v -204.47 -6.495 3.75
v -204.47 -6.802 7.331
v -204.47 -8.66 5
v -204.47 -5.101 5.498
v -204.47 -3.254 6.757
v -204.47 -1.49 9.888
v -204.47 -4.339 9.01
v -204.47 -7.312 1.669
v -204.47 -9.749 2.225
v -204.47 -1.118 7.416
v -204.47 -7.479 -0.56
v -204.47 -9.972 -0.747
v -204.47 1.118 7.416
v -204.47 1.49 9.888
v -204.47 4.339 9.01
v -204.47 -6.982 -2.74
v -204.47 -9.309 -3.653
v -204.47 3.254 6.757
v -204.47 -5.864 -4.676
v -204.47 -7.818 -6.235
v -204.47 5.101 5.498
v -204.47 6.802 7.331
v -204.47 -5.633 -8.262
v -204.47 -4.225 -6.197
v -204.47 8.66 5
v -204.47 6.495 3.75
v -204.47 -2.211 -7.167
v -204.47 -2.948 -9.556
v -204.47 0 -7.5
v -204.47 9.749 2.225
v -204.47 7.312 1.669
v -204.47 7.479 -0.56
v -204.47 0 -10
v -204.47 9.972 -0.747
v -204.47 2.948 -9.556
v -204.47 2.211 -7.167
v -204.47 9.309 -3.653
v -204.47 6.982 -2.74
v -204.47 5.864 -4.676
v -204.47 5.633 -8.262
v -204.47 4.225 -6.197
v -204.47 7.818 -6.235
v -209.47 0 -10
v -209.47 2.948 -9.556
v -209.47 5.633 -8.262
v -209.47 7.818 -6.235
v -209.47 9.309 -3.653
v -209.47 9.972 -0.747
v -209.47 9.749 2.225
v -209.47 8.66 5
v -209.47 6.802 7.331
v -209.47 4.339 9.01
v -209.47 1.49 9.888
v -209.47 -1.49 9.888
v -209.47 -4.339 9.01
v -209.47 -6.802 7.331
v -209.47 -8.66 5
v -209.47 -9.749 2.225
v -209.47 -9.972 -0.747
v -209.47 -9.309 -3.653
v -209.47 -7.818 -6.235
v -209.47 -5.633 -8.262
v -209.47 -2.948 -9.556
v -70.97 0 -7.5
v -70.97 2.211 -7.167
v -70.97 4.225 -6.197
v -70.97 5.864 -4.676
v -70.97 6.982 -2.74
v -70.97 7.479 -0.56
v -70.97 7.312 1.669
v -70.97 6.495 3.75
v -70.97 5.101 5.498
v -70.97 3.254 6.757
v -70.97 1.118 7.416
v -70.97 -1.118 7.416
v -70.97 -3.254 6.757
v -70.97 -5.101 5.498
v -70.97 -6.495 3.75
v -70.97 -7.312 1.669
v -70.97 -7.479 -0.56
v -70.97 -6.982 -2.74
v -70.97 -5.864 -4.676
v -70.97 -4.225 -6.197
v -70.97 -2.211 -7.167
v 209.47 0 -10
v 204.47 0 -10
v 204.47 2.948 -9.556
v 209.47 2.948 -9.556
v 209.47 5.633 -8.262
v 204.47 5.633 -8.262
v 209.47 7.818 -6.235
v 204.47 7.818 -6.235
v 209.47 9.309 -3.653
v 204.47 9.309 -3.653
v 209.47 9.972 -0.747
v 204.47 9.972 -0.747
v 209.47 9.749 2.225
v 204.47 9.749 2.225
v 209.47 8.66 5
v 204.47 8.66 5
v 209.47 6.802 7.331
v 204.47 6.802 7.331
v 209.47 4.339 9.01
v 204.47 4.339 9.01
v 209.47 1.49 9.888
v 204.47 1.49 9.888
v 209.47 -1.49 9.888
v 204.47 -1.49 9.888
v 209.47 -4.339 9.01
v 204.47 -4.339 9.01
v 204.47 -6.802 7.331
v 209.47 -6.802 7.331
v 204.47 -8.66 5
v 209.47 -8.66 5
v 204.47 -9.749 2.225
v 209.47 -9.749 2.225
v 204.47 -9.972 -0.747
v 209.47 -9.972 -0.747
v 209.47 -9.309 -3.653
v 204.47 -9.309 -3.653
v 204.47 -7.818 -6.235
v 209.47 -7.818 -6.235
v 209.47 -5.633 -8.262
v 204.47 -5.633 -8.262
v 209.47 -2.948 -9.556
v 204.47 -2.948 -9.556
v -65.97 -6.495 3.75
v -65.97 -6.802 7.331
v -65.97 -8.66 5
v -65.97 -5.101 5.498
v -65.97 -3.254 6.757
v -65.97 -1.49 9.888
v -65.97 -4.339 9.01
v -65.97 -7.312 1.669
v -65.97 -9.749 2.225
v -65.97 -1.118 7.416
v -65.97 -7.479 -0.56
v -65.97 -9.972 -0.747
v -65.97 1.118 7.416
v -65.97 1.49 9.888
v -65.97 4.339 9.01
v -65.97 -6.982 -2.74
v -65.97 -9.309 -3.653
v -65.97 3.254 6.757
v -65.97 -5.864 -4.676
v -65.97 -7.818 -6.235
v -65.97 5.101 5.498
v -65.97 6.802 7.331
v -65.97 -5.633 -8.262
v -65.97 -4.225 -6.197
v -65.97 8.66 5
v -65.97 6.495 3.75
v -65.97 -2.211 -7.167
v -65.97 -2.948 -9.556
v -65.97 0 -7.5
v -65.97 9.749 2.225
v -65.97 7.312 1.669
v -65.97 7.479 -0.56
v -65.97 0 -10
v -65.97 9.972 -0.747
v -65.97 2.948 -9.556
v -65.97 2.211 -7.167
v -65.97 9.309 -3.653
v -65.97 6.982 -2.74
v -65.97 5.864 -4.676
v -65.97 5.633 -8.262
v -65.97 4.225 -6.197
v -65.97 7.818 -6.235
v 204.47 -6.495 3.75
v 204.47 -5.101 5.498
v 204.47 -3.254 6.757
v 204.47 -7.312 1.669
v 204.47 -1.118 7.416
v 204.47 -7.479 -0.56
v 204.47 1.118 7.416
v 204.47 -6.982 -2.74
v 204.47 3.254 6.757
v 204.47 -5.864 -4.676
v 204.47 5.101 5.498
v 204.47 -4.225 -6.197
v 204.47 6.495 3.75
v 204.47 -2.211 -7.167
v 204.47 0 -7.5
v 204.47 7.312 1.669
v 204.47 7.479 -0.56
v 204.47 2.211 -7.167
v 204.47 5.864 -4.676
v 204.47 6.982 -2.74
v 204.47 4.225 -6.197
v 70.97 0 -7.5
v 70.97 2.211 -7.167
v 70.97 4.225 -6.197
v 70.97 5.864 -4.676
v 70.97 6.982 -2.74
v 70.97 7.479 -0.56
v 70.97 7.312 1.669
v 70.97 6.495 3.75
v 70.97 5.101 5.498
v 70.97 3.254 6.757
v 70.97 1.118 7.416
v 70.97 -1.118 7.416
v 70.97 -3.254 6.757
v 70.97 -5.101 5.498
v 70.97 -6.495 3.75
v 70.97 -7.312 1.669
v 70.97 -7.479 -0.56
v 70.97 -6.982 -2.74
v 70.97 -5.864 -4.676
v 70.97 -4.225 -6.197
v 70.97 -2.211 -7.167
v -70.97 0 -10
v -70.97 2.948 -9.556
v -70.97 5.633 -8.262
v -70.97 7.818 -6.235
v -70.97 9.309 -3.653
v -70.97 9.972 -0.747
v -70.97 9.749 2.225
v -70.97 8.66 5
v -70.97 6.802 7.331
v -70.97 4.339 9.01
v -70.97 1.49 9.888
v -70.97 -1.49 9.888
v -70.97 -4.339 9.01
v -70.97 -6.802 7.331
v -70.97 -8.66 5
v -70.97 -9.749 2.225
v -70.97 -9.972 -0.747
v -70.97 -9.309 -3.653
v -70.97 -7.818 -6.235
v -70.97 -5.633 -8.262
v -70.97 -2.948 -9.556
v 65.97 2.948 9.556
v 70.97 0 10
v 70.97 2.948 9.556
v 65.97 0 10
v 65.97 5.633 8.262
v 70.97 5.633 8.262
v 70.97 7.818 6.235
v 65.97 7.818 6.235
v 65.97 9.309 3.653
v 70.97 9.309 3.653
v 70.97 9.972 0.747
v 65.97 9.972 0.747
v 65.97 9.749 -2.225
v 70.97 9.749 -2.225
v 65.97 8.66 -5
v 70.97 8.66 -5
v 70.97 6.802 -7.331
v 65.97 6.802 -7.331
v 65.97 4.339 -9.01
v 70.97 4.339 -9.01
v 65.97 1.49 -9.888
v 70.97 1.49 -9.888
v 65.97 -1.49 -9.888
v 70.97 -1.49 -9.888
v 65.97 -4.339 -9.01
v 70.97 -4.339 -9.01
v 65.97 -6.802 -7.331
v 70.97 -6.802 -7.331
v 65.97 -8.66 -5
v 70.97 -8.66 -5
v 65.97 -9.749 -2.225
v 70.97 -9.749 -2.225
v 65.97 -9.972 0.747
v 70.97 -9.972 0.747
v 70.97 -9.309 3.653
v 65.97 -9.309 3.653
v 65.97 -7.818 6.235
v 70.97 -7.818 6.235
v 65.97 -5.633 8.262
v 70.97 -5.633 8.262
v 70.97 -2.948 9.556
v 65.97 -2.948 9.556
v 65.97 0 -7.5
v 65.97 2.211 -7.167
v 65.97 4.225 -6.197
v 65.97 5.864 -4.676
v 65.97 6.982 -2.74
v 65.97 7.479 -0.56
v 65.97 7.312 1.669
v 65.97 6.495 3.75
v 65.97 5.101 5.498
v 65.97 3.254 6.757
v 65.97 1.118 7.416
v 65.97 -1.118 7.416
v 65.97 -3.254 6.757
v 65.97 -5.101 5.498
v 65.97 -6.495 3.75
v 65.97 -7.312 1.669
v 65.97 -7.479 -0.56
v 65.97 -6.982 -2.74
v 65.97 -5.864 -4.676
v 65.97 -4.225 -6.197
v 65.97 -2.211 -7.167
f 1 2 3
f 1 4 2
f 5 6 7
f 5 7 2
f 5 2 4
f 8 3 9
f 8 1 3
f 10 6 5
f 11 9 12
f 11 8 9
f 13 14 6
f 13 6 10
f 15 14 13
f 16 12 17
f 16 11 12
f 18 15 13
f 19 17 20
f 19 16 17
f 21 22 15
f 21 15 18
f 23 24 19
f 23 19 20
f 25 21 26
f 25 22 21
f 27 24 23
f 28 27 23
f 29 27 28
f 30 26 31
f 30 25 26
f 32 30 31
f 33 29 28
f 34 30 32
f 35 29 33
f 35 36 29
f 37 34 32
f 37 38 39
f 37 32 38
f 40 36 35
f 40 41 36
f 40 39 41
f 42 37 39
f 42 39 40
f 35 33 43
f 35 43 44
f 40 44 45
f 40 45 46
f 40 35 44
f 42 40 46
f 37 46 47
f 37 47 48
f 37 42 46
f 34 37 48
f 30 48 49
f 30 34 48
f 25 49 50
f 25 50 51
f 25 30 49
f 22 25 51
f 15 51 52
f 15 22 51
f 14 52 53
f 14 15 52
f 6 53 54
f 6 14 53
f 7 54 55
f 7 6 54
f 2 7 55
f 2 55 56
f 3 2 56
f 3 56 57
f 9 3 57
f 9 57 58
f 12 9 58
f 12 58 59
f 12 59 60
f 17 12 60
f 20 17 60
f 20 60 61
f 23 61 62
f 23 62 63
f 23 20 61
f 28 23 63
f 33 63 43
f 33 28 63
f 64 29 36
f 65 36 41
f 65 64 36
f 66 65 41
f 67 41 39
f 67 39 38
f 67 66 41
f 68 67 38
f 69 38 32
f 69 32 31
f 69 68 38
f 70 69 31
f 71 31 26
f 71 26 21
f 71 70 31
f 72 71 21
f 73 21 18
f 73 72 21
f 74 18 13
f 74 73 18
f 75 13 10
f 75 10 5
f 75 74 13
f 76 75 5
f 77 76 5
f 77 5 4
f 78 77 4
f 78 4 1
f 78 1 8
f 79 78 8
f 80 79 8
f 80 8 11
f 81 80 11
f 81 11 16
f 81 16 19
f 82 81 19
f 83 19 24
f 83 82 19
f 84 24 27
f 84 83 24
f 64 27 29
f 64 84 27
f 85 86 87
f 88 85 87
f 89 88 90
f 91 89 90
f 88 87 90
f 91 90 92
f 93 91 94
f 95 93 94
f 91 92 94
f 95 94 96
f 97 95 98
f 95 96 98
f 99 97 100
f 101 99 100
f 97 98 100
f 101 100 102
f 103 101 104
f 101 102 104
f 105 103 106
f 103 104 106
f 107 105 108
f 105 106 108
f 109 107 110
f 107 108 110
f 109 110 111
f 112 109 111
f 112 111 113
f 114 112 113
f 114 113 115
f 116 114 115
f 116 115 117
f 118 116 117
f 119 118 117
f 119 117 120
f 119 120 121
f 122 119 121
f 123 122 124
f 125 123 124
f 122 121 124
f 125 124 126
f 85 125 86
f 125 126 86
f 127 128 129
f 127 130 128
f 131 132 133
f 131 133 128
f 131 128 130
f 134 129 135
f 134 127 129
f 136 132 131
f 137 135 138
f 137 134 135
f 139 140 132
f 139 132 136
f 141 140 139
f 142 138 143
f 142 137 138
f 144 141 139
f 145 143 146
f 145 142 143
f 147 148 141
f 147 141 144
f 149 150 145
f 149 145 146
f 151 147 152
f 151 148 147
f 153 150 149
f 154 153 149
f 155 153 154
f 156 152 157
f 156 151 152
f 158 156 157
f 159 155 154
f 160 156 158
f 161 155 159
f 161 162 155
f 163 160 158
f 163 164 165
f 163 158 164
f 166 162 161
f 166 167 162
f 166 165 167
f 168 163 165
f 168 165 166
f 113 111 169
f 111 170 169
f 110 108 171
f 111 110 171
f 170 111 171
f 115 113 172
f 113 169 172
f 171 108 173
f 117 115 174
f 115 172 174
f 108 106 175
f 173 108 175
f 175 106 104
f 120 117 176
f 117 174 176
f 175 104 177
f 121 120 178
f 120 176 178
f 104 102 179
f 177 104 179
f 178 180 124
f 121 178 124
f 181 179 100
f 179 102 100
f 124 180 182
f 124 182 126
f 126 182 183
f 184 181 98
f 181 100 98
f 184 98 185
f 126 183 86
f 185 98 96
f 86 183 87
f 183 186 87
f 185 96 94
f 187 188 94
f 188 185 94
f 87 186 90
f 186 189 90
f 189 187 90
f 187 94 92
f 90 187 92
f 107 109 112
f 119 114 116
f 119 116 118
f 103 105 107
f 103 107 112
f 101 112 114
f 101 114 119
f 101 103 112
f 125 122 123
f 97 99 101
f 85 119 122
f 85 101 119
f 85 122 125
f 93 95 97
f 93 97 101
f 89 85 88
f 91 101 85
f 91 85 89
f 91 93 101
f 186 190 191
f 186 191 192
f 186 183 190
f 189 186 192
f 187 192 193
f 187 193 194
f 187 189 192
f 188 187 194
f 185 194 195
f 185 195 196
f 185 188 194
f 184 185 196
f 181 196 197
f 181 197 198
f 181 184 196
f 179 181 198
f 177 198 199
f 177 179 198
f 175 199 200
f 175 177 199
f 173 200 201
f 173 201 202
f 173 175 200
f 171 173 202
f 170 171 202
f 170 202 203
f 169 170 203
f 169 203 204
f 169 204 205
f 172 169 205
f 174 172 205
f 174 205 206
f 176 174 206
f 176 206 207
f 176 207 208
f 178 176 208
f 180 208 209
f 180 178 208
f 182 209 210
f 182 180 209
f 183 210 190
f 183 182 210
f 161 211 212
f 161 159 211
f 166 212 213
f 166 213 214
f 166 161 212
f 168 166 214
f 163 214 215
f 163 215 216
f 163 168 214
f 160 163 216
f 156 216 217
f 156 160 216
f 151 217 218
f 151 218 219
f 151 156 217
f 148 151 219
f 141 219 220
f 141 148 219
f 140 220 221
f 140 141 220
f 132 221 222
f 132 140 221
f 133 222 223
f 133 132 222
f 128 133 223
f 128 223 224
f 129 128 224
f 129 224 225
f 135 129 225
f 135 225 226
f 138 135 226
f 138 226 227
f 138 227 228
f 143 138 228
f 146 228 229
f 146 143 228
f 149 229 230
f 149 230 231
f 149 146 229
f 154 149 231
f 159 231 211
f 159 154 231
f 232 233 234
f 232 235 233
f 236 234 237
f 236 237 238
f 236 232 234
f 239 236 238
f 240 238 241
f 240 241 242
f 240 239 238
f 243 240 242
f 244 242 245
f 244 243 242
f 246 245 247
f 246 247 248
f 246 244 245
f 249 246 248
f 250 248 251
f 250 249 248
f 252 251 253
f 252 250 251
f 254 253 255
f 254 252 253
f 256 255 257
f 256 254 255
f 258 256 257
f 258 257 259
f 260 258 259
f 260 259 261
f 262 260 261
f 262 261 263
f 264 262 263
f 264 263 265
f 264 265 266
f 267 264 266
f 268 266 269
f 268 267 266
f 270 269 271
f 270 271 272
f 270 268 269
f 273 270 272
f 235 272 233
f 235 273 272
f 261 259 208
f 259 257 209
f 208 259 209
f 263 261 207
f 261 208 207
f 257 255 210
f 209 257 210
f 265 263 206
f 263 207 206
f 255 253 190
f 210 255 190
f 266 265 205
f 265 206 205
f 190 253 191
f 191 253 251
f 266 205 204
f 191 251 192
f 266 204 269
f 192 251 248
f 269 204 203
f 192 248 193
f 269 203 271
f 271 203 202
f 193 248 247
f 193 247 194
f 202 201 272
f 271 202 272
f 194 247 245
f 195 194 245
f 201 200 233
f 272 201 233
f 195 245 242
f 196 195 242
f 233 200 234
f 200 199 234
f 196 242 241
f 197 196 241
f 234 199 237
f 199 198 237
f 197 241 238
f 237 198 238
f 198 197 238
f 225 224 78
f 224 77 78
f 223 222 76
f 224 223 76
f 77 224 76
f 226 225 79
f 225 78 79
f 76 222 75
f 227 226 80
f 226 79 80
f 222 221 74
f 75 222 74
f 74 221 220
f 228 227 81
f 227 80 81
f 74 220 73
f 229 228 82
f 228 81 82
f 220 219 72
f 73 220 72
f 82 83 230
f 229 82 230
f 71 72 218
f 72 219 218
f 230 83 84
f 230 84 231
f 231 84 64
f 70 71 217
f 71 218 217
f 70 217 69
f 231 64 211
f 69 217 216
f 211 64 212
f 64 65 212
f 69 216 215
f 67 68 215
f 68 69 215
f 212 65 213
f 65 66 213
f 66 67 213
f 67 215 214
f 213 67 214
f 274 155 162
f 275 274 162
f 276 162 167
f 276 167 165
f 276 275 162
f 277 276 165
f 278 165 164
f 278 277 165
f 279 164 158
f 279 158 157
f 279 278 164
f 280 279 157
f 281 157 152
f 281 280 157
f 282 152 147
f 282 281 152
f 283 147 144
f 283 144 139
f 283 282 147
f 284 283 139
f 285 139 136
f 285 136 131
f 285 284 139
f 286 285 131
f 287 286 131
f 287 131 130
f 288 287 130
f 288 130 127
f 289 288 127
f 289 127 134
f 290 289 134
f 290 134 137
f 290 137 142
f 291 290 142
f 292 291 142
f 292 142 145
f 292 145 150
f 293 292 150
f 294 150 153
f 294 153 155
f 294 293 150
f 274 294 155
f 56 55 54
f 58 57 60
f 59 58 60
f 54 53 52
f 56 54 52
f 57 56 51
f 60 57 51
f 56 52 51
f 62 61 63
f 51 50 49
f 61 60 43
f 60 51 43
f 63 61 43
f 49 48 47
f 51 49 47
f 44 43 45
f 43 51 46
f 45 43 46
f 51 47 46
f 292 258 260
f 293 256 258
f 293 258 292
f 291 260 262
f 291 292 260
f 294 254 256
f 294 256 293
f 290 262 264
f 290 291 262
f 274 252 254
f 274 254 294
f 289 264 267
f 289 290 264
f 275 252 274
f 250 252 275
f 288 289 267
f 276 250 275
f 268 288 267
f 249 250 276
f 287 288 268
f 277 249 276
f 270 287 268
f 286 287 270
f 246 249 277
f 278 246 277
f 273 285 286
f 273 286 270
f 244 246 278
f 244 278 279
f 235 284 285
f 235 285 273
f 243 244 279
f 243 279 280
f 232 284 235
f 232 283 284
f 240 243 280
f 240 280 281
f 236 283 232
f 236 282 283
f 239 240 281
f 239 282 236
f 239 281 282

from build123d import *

# Parameters (mm, degrees)
SKETCH1_R           = 7.5
BOSS_EXTRUDE1_DEPTH = 204.47
SKETCH2_R           = 10
BOSS_EXTRUDE2_DEPTH = 5
SKETCH3_R           = 10
BOSS_EXTRUDE3_DEPTH = 2.5
SKETCH4_R           = 10
BOSS_EXTRUDE4_DEPTH = 2.5


with BuildPart() as part:
    # Sketch1 → Boss-Extrude1 (new body, symmetric)
    with BuildSketch(Plane(origin=(0, 0, 0), x_dir=(0, 0, -1), z_dir=(1, 0, 0))):
        Circle(SKETCH1_R)
    extrude(amount=BOSS_EXTRUDE1_DEPTH, both=True)


with BuildPart() as body_2:
    # Sketch2 → Boss-Extrude2 (new body)
    with BuildSketch(Plane(origin=(204.47, 0, 0), x_dir=(0, 0, -1), z_dir=(1, 0, 0))):
        Circle(SKETCH2_R)
    extrude(amount=BOSS_EXTRUDE2_DEPTH)


with BuildPart() as body_3:
    # Mirror1: mirrored copy
    add(body_2.part.mirror(Plane(origin=(0, 0, 0), x_dir=(0, 0, 1), z_dir=(1, 0, 0))))

    # Combine1: union body 2, part
    add(body_2.part)
    add(part.part)

    # Sketch3 → Boss-Extrude3 (add, symmetric)
    with BuildSketch(Plane(origin=(-68.469999966, 0, 0), x_dir=(0, 0, -1), z_dir=(1, 0, 0))):
        Circle(SKETCH3_R)
    extrude(amount=BOSS_EXTRUDE3_DEPTH, both=True)

    # Sketch4 → Boss-Extrude4 (add, symmetric)
    with BuildSketch(Plane.ZY.offset(-68.469999966)):
        Circle(SKETCH4_R)
    extrude(amount=BOSS_EXTRUDE4_DEPTH, both=True)


solid = body_3.part
